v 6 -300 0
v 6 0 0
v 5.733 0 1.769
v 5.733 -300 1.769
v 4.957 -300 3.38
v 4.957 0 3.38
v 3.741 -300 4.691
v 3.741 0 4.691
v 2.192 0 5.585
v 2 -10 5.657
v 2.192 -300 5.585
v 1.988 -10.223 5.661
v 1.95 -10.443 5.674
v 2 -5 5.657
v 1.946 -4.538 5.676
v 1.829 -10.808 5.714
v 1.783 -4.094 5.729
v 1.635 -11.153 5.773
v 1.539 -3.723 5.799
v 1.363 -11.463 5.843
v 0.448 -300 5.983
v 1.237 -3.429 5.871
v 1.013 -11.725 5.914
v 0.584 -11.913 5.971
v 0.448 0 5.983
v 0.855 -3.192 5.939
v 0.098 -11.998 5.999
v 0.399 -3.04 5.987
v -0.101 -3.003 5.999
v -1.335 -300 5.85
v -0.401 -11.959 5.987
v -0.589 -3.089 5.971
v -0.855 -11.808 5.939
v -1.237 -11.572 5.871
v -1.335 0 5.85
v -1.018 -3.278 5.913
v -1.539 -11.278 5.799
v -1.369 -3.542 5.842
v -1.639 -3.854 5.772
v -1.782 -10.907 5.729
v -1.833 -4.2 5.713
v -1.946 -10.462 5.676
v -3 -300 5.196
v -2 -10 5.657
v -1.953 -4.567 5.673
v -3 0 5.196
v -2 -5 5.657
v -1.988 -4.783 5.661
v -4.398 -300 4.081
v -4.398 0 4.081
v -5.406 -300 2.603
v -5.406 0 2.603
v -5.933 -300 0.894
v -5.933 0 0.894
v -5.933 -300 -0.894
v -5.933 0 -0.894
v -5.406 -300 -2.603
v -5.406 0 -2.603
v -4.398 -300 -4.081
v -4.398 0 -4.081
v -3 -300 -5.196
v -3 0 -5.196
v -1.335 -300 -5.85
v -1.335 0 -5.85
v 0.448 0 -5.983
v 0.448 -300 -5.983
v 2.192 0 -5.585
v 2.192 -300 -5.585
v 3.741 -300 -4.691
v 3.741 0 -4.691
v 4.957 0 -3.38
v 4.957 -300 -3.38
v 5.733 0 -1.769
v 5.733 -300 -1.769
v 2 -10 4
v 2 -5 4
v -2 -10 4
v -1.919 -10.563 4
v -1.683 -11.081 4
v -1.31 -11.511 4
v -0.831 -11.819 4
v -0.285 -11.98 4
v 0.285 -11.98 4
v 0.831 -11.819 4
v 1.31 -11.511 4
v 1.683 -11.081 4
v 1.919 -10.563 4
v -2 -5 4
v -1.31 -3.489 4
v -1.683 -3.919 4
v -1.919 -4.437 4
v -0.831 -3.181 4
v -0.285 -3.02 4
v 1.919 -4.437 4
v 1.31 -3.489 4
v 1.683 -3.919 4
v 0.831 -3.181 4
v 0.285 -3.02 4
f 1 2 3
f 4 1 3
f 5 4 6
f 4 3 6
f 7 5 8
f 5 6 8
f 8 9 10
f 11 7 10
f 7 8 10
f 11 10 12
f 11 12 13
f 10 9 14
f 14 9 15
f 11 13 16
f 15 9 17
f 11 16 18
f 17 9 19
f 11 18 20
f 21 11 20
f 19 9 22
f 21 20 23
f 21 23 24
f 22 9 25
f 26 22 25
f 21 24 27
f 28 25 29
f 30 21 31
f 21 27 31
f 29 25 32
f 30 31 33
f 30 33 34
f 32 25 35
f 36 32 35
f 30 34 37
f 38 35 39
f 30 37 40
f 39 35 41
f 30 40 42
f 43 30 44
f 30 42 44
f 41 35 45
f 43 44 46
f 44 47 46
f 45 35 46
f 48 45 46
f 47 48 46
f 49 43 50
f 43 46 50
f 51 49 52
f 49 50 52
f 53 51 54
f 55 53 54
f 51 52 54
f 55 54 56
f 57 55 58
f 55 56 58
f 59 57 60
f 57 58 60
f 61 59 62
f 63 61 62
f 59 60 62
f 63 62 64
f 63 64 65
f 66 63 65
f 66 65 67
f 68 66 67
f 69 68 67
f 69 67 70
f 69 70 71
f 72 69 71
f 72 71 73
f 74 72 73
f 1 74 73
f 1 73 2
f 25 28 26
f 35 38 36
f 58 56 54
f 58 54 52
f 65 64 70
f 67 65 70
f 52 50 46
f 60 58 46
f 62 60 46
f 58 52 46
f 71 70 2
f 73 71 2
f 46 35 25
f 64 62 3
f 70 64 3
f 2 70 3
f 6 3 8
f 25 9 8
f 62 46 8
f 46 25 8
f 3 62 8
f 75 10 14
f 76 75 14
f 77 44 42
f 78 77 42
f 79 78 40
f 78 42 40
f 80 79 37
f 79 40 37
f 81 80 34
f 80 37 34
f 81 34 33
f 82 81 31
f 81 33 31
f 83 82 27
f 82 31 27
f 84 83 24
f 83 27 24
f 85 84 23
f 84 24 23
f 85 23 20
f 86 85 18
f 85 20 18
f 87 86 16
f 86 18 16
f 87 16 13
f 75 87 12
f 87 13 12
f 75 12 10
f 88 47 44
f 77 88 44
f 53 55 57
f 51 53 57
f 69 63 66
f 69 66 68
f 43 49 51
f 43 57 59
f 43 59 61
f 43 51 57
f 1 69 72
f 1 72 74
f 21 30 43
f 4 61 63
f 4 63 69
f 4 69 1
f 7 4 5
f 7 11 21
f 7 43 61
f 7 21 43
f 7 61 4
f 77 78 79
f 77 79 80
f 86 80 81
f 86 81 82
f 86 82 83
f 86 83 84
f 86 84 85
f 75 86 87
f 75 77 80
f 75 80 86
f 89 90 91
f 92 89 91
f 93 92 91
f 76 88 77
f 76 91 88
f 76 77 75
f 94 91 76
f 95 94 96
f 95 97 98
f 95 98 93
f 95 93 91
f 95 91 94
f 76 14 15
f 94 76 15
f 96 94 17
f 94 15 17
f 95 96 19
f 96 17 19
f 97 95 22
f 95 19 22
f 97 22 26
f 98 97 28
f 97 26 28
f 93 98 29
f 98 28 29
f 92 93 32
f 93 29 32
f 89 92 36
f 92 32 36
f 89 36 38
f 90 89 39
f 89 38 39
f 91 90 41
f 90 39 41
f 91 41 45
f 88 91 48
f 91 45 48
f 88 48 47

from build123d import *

# Parameters (mm, degrees)
F0_R     = 6
F1_DEPTH = 300
F4_DEPTH = 4


with BuildPart() as f1:
    # F0 (on Front) → F1 (new body)
    with BuildSketch(Plane.XZ):
        Circle(F0_R)
    extrude(amount=F1_DEPTH)

    # F3 (on offset) → F4 (cut)
    with BuildSketch(Plane.XY.offset(8)):
        with BuildLine():
            Line((-2, -5), (-2, -10))
            ThreePointArc((-2, -10), (0, -12), (2, -10))
            Line((2, -10), (2, -5))
            ThreePointArc((2, -5), (0, -3), (-2, -5))
        make_face()
    extrude(amount=-F4_DEPTH, mode=Mode.SUBTRACT)


solid = f1.part
